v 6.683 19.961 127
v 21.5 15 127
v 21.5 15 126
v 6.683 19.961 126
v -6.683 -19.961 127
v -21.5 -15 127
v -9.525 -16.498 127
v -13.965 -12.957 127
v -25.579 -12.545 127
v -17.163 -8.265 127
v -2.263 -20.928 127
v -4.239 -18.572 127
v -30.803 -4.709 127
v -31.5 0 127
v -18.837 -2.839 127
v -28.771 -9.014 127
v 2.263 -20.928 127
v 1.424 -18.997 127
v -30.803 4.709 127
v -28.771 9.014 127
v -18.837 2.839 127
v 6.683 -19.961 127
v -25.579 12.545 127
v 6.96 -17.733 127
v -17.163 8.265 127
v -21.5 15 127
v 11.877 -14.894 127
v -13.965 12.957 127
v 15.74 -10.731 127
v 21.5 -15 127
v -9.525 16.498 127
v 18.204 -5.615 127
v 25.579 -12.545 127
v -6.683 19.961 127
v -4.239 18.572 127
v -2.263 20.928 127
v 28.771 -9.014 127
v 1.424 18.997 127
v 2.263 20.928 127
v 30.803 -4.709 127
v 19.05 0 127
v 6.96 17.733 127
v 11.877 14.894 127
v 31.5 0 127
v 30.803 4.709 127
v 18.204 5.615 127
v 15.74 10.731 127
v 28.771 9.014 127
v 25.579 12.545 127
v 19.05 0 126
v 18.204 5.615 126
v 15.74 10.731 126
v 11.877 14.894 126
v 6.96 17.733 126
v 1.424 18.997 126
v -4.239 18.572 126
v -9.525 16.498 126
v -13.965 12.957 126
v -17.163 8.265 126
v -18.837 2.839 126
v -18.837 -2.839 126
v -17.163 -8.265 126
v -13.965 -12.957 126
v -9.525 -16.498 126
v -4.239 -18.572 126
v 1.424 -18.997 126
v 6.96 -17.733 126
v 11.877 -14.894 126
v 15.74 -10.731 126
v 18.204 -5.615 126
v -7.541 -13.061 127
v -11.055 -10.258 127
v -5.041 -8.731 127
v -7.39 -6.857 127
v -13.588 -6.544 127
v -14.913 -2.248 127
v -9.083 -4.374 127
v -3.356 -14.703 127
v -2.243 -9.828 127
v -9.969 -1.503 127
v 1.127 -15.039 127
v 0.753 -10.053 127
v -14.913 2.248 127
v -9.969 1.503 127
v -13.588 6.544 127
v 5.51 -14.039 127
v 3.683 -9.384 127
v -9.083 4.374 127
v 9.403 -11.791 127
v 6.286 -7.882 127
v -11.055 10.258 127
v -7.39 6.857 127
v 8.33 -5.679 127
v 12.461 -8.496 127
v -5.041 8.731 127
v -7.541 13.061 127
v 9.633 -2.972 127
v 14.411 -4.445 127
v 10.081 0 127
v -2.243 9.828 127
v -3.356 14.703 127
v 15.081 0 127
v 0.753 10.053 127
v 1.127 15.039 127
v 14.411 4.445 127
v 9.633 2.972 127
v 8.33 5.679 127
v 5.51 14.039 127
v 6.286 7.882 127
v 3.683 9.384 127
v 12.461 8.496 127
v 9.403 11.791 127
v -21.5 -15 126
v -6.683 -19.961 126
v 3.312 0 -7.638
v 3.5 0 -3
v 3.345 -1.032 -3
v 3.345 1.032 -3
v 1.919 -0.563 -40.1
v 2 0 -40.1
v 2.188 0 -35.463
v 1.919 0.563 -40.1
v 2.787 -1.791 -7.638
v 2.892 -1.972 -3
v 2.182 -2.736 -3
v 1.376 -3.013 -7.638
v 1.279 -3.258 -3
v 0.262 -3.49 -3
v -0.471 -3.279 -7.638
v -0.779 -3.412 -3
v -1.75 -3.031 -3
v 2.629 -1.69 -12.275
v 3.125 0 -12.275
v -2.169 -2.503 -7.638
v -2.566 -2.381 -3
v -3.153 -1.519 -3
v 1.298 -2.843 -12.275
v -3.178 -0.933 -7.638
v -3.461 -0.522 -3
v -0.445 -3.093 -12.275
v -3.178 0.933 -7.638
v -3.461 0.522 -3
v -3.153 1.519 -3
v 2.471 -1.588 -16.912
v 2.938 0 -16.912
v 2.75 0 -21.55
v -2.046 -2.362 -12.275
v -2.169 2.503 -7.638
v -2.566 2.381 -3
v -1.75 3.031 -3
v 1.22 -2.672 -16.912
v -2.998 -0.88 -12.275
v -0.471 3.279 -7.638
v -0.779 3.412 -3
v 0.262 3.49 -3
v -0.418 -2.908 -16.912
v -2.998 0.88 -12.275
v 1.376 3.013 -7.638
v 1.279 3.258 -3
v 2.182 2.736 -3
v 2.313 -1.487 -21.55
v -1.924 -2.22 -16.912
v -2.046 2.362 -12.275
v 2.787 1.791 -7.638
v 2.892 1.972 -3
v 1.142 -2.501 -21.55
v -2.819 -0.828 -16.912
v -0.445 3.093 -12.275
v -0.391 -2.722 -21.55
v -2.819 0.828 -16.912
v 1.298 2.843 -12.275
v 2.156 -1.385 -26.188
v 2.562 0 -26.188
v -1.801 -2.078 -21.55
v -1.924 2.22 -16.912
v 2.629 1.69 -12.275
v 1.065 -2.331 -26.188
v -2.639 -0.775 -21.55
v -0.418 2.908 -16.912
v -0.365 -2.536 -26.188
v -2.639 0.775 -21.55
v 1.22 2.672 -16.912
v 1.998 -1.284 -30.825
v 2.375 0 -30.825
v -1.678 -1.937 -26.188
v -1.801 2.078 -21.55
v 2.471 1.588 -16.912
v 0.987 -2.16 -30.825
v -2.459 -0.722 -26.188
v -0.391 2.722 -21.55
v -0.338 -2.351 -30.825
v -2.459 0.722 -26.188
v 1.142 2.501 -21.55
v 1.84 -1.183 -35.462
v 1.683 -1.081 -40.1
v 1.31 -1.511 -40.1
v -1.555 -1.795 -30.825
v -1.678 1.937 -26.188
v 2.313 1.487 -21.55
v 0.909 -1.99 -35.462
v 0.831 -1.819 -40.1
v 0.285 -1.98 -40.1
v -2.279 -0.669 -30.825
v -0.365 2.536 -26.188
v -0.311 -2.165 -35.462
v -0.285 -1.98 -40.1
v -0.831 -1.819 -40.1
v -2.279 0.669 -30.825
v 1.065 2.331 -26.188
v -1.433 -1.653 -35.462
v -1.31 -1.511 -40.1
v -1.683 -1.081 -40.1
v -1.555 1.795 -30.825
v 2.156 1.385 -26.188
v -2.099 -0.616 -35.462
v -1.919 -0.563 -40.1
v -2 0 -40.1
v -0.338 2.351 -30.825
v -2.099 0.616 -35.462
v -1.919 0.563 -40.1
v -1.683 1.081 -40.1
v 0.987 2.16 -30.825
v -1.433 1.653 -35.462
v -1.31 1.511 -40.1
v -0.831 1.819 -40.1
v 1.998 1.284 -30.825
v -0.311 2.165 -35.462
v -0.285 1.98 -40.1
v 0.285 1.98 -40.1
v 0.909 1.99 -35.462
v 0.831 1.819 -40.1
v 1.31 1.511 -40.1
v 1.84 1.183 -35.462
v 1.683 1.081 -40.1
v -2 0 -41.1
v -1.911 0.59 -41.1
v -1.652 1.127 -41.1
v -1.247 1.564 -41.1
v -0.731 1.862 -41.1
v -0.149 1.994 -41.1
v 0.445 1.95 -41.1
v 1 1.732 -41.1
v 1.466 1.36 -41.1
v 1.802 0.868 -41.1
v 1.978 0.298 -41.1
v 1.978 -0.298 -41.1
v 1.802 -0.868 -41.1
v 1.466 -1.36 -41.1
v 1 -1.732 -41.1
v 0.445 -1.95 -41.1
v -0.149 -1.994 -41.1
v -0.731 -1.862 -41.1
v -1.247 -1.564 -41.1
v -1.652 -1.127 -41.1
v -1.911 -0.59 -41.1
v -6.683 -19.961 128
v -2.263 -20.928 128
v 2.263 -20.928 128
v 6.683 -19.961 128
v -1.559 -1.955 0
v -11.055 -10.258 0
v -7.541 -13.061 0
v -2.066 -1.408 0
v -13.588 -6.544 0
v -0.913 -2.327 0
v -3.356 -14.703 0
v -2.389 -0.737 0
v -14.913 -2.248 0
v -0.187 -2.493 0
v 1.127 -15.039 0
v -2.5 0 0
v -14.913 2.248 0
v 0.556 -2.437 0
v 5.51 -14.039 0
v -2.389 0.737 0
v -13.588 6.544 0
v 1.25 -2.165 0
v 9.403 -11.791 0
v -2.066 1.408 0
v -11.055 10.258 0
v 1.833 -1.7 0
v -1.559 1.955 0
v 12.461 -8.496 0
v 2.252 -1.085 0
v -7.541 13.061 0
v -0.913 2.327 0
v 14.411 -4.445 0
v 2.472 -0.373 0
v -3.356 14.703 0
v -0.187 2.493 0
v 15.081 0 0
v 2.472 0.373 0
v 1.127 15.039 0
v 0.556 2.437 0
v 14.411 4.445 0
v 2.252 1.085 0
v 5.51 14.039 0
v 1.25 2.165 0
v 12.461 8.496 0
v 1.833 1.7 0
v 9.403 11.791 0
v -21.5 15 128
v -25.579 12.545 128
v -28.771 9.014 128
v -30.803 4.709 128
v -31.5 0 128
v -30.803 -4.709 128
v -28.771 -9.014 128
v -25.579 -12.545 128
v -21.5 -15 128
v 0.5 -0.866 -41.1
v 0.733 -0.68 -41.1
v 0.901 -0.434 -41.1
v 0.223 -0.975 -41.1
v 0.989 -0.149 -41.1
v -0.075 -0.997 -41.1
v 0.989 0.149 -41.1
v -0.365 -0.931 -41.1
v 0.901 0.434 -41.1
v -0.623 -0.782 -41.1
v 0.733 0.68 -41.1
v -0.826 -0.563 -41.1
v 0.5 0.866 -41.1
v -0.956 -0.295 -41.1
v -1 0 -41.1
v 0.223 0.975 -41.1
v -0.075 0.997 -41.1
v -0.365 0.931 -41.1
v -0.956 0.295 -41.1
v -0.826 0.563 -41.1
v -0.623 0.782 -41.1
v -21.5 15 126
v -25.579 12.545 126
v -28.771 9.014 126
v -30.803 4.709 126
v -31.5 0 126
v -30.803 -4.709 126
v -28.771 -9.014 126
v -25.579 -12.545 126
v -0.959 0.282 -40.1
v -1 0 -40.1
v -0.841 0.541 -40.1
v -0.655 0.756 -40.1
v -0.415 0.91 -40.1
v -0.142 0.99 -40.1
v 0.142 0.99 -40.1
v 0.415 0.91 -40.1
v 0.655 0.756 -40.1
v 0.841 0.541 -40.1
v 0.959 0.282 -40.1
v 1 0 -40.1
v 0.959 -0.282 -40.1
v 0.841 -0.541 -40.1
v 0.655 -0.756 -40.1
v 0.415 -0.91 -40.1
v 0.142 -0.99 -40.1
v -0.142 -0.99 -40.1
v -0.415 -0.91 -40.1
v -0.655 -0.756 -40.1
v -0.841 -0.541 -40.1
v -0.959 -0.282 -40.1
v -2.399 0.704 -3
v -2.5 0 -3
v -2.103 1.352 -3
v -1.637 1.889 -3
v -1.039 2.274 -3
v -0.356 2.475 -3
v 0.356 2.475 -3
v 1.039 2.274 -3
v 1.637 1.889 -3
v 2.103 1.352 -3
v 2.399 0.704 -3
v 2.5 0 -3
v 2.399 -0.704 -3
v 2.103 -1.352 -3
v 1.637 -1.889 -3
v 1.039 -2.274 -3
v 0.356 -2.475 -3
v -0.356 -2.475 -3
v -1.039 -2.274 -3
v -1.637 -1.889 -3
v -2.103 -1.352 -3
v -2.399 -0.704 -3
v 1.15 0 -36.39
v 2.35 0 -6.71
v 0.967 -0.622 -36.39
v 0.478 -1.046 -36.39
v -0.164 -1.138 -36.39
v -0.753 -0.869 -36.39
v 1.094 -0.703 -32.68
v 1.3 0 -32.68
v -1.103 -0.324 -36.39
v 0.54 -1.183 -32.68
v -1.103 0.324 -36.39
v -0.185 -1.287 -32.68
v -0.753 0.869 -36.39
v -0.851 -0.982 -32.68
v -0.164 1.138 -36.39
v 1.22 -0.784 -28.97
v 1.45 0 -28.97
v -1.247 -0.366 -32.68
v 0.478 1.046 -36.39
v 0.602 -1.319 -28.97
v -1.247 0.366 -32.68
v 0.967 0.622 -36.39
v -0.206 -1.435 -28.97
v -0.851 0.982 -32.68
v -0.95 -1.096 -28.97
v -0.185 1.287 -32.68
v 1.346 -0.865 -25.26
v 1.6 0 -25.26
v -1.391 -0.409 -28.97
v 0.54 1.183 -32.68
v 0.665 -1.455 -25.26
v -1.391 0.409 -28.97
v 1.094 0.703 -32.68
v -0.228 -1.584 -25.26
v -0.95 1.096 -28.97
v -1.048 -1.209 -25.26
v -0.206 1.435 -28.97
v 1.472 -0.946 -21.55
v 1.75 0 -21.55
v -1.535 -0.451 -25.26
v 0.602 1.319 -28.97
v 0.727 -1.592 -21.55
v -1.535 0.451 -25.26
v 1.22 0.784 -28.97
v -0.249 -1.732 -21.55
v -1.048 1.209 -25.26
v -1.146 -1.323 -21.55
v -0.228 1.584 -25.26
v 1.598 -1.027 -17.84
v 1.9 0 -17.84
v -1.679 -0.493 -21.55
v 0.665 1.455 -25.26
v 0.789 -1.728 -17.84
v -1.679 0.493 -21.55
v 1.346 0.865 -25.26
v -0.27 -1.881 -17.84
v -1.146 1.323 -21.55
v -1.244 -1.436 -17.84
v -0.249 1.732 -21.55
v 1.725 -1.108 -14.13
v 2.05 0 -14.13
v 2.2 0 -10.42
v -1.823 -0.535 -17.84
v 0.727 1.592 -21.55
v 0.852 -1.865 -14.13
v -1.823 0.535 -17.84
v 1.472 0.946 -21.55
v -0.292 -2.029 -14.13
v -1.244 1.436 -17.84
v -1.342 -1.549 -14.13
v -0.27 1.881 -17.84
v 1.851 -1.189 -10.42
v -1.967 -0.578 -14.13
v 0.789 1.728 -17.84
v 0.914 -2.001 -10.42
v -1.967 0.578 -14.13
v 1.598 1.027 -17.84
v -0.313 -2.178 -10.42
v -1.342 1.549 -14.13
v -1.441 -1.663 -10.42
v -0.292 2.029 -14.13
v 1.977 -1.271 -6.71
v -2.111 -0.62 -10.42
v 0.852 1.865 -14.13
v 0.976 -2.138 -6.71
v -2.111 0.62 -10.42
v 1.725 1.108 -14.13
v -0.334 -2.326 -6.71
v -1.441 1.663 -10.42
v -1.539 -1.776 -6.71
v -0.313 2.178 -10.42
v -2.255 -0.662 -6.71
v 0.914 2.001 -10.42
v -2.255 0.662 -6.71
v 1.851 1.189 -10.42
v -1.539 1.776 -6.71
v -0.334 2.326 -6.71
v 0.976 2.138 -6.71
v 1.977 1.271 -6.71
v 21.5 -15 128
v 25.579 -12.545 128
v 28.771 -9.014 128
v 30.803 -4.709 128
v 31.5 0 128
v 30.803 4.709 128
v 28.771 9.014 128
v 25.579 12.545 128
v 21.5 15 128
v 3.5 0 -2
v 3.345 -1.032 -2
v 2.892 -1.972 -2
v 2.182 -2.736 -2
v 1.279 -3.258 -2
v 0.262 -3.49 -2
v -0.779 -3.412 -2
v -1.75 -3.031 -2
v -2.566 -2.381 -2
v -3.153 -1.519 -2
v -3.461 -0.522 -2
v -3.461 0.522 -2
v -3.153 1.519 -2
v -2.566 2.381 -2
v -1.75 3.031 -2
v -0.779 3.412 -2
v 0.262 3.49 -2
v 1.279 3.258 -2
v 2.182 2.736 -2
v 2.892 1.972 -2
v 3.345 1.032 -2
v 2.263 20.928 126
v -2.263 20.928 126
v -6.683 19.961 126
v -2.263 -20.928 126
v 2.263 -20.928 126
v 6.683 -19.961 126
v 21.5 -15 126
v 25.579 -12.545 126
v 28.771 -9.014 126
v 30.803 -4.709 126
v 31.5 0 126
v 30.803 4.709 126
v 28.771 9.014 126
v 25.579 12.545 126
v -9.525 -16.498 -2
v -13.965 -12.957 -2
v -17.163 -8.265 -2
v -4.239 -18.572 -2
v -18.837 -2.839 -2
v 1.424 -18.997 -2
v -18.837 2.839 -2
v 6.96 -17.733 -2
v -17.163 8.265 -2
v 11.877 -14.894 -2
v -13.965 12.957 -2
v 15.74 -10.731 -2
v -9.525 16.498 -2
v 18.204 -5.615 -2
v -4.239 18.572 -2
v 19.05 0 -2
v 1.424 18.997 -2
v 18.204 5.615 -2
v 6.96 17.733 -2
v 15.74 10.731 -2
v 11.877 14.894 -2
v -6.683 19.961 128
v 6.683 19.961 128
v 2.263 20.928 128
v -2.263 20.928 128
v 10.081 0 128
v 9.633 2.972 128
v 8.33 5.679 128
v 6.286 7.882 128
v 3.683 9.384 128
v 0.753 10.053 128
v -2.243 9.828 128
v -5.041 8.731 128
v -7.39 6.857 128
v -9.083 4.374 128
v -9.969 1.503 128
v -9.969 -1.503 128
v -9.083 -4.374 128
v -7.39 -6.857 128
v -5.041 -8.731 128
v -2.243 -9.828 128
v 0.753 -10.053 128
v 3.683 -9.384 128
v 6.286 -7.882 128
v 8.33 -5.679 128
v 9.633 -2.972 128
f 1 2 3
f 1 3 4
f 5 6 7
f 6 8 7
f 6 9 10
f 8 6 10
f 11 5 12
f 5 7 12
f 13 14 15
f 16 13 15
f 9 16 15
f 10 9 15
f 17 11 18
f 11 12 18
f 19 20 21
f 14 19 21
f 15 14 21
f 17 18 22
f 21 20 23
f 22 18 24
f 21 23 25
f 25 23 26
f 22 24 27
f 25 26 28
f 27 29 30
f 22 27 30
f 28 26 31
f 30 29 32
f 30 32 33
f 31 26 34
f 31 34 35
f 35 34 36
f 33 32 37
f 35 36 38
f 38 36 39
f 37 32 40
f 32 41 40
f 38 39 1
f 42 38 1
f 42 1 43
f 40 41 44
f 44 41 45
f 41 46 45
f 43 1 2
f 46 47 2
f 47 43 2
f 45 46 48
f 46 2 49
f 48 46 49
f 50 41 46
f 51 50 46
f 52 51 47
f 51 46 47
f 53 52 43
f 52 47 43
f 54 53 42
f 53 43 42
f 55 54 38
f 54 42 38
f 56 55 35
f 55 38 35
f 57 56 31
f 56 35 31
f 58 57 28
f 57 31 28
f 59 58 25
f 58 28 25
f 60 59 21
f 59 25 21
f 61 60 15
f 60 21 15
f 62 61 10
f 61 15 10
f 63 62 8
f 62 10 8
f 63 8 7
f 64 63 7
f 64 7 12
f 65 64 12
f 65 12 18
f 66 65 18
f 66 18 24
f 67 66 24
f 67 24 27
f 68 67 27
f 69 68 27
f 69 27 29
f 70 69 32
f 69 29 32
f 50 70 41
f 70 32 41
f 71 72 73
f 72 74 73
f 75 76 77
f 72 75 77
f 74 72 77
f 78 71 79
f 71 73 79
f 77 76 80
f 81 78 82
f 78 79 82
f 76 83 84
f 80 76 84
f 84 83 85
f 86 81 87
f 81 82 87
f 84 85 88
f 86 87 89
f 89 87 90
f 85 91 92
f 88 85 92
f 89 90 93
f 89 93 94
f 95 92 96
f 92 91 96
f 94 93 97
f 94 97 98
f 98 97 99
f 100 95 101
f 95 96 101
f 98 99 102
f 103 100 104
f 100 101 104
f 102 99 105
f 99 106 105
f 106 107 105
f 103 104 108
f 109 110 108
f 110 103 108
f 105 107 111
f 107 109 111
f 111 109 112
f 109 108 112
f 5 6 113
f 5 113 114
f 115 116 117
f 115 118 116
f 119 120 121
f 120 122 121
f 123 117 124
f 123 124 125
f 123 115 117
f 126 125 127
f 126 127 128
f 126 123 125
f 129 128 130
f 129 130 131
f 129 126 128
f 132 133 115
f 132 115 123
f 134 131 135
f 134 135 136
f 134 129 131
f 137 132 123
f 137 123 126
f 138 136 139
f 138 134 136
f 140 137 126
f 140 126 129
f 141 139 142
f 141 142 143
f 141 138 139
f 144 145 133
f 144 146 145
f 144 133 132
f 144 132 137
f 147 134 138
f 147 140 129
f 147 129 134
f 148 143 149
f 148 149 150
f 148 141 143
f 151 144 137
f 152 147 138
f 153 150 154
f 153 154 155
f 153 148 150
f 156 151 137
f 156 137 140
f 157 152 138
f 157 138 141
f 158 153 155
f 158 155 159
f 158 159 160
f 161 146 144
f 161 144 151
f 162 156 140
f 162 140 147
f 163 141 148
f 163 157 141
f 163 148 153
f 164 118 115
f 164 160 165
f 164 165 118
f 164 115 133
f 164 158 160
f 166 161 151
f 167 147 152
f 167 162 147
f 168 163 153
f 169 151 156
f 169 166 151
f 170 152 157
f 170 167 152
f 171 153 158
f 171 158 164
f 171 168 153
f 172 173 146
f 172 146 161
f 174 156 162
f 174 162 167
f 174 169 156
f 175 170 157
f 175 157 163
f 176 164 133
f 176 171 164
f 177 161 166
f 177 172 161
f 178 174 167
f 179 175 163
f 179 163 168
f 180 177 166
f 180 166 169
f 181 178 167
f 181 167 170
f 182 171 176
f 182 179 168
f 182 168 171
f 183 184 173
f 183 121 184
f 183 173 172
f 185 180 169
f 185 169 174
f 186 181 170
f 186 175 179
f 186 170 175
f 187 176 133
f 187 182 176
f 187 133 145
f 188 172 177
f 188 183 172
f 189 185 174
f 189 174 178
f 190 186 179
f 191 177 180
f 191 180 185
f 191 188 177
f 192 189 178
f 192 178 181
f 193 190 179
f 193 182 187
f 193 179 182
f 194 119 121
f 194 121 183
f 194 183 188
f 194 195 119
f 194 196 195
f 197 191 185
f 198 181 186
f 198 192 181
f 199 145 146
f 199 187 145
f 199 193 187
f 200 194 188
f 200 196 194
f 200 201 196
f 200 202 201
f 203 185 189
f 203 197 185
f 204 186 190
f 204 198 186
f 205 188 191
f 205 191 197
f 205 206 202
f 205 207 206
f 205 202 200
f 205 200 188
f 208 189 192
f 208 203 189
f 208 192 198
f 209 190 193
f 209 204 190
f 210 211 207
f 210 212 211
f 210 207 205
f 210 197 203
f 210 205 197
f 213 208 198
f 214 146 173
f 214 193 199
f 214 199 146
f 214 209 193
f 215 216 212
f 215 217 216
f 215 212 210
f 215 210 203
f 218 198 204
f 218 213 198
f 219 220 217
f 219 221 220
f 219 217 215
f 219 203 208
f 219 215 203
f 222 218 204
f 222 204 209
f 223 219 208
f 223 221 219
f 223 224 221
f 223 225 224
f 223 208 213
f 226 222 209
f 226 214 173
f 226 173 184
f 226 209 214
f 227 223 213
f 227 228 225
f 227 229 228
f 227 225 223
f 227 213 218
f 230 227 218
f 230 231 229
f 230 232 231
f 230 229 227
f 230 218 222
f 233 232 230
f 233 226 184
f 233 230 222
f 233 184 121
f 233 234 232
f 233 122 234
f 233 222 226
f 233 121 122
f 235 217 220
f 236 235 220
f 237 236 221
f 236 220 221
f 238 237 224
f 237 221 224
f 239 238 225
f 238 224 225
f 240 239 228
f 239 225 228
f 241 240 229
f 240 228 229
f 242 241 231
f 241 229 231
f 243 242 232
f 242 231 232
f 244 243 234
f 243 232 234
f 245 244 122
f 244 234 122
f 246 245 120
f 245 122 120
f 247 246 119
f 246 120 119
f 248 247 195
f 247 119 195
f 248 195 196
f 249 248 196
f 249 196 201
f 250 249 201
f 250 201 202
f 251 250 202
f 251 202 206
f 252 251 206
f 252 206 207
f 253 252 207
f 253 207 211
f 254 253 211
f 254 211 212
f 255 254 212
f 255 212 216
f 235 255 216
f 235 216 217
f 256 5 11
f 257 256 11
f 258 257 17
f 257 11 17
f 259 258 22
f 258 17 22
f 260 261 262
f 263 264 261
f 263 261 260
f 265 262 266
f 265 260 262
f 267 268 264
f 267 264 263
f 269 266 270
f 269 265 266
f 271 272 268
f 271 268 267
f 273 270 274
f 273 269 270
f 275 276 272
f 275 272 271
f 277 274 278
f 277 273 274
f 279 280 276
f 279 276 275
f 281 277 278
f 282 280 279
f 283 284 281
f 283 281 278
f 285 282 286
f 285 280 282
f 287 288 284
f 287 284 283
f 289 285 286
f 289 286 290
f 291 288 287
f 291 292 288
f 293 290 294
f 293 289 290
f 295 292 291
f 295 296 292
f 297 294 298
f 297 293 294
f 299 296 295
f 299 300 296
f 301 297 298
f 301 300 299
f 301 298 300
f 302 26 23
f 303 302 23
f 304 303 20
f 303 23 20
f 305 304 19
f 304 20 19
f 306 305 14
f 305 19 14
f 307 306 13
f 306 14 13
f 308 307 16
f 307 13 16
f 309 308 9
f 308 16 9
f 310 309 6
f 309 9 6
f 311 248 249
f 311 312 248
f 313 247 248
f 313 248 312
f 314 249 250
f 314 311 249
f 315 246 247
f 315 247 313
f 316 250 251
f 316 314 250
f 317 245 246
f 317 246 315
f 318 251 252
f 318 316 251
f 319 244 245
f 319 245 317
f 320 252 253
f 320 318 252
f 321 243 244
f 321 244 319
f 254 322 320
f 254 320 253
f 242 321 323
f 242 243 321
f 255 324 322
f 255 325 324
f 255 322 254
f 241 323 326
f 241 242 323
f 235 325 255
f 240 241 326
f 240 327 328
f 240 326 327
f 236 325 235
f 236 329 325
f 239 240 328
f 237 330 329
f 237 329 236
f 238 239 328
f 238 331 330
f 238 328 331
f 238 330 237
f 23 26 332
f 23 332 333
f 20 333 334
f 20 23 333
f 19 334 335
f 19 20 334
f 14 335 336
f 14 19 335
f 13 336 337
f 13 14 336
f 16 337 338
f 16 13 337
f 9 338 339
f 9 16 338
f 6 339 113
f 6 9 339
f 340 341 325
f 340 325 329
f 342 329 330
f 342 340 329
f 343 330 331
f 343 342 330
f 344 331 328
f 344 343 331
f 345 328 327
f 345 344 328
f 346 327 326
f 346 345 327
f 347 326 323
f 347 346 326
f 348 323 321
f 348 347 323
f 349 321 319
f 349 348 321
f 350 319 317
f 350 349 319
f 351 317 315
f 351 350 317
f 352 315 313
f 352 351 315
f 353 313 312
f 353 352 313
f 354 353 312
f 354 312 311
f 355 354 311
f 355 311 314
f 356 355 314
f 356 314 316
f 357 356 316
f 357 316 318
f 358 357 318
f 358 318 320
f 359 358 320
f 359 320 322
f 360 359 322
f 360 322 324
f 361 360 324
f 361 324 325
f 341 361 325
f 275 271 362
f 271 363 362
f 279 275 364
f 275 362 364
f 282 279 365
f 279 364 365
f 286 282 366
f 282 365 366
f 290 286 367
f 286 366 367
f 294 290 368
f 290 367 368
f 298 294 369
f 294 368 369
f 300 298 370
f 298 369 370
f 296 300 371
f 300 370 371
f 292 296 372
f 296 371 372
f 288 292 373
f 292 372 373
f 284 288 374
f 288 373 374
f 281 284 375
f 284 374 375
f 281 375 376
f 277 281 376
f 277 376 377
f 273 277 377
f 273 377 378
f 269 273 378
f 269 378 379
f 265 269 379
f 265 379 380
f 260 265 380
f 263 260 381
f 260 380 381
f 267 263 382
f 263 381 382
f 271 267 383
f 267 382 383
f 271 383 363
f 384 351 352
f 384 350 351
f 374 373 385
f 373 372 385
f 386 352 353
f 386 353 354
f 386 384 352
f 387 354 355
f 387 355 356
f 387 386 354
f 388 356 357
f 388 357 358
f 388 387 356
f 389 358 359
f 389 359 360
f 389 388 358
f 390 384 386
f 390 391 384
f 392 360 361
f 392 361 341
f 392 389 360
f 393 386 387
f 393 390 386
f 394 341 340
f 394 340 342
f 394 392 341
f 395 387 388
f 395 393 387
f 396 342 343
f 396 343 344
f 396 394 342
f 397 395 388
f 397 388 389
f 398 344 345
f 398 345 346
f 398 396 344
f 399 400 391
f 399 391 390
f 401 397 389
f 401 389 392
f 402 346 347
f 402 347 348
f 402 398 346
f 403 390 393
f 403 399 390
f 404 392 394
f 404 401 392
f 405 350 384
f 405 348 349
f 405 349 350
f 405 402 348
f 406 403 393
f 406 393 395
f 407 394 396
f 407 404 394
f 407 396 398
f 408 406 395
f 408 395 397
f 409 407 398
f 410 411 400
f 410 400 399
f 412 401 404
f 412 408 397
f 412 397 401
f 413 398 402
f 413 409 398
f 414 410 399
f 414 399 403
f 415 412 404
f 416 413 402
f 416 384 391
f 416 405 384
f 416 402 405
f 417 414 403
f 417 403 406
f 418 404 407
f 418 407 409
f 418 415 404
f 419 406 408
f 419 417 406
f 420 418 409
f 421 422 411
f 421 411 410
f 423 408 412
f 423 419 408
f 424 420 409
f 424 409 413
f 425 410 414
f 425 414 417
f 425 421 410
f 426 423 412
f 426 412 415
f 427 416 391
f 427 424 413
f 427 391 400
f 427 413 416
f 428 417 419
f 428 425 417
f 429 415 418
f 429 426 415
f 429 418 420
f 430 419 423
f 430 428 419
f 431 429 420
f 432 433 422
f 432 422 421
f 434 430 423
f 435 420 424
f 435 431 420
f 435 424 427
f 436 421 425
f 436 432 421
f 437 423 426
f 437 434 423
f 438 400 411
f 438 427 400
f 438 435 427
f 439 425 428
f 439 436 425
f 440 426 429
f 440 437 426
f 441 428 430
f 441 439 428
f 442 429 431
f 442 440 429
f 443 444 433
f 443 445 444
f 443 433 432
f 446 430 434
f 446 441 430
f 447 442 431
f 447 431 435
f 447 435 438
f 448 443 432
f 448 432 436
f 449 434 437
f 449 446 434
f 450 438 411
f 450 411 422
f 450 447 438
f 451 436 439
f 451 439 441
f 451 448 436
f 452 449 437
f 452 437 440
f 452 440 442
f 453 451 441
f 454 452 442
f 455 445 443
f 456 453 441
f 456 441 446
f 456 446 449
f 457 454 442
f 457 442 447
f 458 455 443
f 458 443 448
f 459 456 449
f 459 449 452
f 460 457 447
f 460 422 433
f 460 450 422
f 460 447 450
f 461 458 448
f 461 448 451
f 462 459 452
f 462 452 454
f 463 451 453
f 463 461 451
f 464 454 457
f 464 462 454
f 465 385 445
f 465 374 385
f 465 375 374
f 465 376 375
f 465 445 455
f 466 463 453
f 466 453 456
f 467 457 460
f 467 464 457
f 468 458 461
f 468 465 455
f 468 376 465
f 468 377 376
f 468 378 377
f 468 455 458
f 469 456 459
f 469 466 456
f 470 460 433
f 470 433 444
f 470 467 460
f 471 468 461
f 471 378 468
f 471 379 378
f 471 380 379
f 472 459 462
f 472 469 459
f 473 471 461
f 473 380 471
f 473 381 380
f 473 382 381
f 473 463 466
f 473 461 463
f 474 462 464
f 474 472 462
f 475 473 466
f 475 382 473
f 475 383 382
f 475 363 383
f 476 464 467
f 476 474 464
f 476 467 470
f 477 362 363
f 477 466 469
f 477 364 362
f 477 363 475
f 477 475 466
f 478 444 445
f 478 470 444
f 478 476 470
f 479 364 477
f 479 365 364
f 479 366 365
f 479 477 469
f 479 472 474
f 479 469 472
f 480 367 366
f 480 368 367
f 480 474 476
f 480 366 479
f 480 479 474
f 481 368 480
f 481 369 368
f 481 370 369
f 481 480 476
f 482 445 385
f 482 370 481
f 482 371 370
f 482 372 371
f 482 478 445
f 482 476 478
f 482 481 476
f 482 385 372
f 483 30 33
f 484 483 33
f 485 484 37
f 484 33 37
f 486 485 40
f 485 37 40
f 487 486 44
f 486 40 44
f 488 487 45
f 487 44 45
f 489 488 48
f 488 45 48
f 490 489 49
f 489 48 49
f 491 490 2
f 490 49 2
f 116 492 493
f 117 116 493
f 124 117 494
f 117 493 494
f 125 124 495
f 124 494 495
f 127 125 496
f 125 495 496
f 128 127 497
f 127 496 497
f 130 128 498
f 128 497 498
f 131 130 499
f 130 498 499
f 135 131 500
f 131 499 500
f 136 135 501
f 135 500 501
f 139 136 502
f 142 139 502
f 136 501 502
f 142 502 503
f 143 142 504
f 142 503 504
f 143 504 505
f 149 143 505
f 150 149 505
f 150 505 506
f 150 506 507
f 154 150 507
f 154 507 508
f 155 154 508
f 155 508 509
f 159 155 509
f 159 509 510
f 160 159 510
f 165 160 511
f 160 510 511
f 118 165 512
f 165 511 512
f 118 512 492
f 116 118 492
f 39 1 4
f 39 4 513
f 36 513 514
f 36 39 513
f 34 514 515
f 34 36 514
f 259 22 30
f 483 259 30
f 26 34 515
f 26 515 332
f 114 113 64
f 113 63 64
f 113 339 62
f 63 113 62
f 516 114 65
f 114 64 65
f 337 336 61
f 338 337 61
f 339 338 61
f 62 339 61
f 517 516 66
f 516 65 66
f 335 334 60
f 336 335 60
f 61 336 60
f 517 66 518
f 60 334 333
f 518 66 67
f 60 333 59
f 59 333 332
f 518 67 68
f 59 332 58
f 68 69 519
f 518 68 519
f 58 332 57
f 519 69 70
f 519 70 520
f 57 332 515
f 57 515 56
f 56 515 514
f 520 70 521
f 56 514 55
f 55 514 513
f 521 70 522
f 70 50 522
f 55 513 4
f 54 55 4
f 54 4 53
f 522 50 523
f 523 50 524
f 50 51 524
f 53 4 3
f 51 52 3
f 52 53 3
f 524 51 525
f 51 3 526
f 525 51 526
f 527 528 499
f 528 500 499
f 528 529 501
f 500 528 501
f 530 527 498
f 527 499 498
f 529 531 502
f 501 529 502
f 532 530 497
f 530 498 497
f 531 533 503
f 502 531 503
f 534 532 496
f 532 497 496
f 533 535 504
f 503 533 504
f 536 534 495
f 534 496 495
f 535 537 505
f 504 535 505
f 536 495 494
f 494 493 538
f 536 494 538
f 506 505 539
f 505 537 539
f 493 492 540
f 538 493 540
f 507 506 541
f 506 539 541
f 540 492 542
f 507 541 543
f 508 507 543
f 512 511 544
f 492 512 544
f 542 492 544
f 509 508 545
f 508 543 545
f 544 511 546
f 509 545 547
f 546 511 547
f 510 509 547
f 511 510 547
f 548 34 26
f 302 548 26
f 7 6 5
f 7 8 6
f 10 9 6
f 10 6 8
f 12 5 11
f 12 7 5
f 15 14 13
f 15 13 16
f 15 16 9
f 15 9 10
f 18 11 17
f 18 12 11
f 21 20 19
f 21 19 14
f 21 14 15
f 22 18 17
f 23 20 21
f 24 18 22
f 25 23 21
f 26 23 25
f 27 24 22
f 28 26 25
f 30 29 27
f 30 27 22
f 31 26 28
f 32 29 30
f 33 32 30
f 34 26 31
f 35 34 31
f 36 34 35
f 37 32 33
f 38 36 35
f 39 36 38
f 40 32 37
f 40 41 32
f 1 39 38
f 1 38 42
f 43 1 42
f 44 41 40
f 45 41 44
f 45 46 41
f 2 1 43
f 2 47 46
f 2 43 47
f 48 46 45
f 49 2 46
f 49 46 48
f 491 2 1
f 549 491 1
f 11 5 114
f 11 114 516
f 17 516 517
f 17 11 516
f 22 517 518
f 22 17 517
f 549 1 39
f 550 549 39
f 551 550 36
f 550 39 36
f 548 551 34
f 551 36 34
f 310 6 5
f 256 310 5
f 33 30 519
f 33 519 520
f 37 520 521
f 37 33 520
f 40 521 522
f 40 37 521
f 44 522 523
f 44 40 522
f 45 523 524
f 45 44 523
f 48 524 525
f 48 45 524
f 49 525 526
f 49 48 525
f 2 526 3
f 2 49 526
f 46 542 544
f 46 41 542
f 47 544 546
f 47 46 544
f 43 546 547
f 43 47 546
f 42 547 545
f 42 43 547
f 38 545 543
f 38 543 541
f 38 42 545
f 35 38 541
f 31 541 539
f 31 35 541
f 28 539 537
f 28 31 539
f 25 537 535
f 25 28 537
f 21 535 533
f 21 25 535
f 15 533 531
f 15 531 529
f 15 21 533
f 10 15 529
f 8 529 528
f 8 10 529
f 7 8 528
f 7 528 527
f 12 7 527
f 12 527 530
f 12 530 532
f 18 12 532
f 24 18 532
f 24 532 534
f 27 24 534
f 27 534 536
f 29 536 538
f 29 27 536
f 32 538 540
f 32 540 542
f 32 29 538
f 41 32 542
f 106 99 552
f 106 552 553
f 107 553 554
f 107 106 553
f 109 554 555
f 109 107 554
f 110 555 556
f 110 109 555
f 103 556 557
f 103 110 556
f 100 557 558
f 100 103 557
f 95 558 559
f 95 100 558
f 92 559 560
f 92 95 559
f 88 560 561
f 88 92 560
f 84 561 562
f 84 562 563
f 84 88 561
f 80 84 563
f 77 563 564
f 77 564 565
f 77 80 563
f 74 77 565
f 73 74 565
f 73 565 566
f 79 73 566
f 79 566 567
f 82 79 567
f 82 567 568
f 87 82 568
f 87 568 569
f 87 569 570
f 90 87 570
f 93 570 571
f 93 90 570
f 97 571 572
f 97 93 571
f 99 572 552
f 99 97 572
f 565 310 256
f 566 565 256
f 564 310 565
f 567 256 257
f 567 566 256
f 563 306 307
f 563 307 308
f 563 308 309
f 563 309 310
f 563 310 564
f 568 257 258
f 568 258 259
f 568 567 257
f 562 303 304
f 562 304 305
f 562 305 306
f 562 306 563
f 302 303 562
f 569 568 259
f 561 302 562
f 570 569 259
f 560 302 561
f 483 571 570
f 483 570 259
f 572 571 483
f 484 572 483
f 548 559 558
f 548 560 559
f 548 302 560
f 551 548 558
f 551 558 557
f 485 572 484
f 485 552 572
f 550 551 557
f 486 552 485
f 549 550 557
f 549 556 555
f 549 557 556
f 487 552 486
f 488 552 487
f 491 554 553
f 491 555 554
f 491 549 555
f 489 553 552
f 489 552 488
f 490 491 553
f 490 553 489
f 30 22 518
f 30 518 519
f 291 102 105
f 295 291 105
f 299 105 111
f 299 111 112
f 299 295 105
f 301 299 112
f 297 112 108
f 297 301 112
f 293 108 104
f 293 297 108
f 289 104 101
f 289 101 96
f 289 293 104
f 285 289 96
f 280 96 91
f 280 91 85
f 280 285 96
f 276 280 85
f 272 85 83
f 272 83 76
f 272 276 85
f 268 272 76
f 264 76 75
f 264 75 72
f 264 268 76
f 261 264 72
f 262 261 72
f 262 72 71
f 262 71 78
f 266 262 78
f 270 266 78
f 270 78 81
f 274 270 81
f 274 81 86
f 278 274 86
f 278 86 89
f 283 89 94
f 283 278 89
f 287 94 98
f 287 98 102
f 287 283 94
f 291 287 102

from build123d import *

# Parameters (mm, degrees)
SKETCH1_R           = 19.05
SKETCH1_R_2         = 15.08125
BOSS_EXTRUDE1_DEPTH = 127
BOSS_EXTRUDE2_START = -2
SKETCH1_2_R         = 19.05
BOSS_EXTRUDE2_DEPTH = 2
SKETCH2_R           = 2.5
CUT_EXTRUDE1_DEPTH  = 132.783174192
BOSS_EXTRUDE3_START = 1
SKETCH2_5_R         = 3.5
SKETCH2_5_R_2       = 2.5
BOSS_EXTRUDE3_DEPTH = 1
BOSS_EXTRUDE4_START = 38.1
SKETCH2_6_R         = 2
SKETCH2_6_R_2       = 1
BOSS_EXTRUDE4_DEPTH = 1
SKETCH4_R           = 19.05
BOSS_EXTRUDE5_DEPTH = 1
SKETCH4_3_R         = 10.08125
BOSS_EXTRUDE6_DEPTH = 1


with BuildPart() as part:
    # Sketch1 → Boss-Extrude1 (new body)
    with BuildSketch(Plane.XY):
        Circle(SKETCH1_R)
        Circle(SKETCH1_R_2, mode=Mode.SUBTRACT)
    extrude(amount=BOSS_EXTRUDE1_DEPTH)

    # Sketch1<2> → Boss-Extrude2 (add)
    with BuildSketch(Plane.XY.offset(BOSS_EXTRUDE2_START)):
        Circle(SKETCH1_2_R)
    extrude(amount=BOSS_EXTRUDE2_DEPTH)

    # Sketch2 → Cut-Extrude1 (cut, through all)
    with BuildSketch(Plane(origin=(0, 0, -2), x_dir=(-1, 0, 0), z_dir=(0, 0, -1))):
        Circle(SKETCH2_R)
    extrude(amount=-CUT_EXTRUDE1_DEPTH, mode=Mode.SUBTRACT)

    # Sketch2<5> → Boss-Extrude3 (add)
    with BuildSketch(Plane(origin=(0, 0, -2), x_dir=(-1, 0, 0), z_dir=(0, 0, -1)).offset(BOSS_EXTRUDE3_START)):
        Circle(SKETCH2_5_R)
        Circle(SKETCH2_5_R_2, mode=Mode.SUBTRACT)
    extrude(amount=-BOSS_EXTRUDE3_DEPTH)



with BuildPart() as body_2:
    # Sketch2<6> → Boss-Extrude4 (new body)
    with BuildSketch(Plane(origin=(0, 0, -2), x_dir=(-1, 0, 0), z_dir=(0, 0, -1)).offset(BOSS_EXTRUDE4_START)):
        Circle(SKETCH2_6_R)
        Circle(SKETCH2_6_R_2, mode=Mode.SUBTRACT)
    extrude(amount=BOSS_EXTRUDE4_DEPTH)


with BuildPart() as part_1:
    add(part.part)

    add(body_2.part)  # Revolve1 merges body 2
    # Sketch3 → Revolve1 (revolve)
    with BuildSketch(Plane(origin=(0, 0, 0), x_dir=(0, 0, -1), z_dir=(1, 0, 0))):
        Polygon((3, 3.5), (40.1, 2), (40.1, 1), (3, 2.5), align=None)
    revolve(axis=Axis((0, 0, 158.4), (0, 0, -1)))

    # Sketch4<3> → Boss-Extrude6 (add)
    with BuildSketch(Plane.XY.offset(127)):
        with BuildLine():
            Line((-6.683216494, 19.960889692), (-21.5, 15))
            ThreePointArc((-21.5, 15), (-31.5, 0), (-21.5, -15))
            Line((-21.5, -15), (-6.683216494, -19.960889692))
            ThreePointArc((-6.683216494, -19.960889692), (0, -21.05), (6.683216494, -19.960889692))
            Line((6.683216494, -19.960889692), (21.5, -15))
            ThreePointArc((21.5, -15), (31.5, 0), (21.5, 15))
            Line((21.5, 15), (6.683216494, 19.960889692))
            ThreePointArc((6.683216494, 19.960889692), (0, 21.05), (-6.683216494, 19.960889692))
        make_face()
        Circle(SKETCH4_3_R, mode=Mode.SUBTRACT)
    extrude(amount=BOSS_EXTRUDE6_DEPTH)


with BuildPart() as body_2_2:
    # Sketch4 → Boss-Extrude5 (new body)
    with BuildSketch(Plane.XY.offset(127)):
        with BuildLine():
            Line((-6.683216494, 19.960889692), (-21.5, 15))
            ThreePointArc((-21.5, 15), (-31.5, 0), (-21.5, -15))
            Line((-21.5, -15), (-6.683216494, -19.960889692))
            ThreePointArc((-6.683216494, -19.960889692), (0, -21.05), (6.683216494, -19.960889692))
            Line((6.683216494, -19.960889692), (21.5, -15))
            ThreePointArc((21.5, -15), (31.5, 0), (21.5, 15))
            Line((21.5, 15), (6.683216494, 19.960889692))
            ThreePointArc((6.683216494, 19.960889692), (0, 21.05), (-6.683216494, 19.960889692))
        make_face()
        Circle(SKETCH4_R, mode=Mode.SUBTRACT)
    extrude(amount=-BOSS_EXTRUDE5_DEPTH)


solid = Compound([part_1.part, body_2_2.part])
